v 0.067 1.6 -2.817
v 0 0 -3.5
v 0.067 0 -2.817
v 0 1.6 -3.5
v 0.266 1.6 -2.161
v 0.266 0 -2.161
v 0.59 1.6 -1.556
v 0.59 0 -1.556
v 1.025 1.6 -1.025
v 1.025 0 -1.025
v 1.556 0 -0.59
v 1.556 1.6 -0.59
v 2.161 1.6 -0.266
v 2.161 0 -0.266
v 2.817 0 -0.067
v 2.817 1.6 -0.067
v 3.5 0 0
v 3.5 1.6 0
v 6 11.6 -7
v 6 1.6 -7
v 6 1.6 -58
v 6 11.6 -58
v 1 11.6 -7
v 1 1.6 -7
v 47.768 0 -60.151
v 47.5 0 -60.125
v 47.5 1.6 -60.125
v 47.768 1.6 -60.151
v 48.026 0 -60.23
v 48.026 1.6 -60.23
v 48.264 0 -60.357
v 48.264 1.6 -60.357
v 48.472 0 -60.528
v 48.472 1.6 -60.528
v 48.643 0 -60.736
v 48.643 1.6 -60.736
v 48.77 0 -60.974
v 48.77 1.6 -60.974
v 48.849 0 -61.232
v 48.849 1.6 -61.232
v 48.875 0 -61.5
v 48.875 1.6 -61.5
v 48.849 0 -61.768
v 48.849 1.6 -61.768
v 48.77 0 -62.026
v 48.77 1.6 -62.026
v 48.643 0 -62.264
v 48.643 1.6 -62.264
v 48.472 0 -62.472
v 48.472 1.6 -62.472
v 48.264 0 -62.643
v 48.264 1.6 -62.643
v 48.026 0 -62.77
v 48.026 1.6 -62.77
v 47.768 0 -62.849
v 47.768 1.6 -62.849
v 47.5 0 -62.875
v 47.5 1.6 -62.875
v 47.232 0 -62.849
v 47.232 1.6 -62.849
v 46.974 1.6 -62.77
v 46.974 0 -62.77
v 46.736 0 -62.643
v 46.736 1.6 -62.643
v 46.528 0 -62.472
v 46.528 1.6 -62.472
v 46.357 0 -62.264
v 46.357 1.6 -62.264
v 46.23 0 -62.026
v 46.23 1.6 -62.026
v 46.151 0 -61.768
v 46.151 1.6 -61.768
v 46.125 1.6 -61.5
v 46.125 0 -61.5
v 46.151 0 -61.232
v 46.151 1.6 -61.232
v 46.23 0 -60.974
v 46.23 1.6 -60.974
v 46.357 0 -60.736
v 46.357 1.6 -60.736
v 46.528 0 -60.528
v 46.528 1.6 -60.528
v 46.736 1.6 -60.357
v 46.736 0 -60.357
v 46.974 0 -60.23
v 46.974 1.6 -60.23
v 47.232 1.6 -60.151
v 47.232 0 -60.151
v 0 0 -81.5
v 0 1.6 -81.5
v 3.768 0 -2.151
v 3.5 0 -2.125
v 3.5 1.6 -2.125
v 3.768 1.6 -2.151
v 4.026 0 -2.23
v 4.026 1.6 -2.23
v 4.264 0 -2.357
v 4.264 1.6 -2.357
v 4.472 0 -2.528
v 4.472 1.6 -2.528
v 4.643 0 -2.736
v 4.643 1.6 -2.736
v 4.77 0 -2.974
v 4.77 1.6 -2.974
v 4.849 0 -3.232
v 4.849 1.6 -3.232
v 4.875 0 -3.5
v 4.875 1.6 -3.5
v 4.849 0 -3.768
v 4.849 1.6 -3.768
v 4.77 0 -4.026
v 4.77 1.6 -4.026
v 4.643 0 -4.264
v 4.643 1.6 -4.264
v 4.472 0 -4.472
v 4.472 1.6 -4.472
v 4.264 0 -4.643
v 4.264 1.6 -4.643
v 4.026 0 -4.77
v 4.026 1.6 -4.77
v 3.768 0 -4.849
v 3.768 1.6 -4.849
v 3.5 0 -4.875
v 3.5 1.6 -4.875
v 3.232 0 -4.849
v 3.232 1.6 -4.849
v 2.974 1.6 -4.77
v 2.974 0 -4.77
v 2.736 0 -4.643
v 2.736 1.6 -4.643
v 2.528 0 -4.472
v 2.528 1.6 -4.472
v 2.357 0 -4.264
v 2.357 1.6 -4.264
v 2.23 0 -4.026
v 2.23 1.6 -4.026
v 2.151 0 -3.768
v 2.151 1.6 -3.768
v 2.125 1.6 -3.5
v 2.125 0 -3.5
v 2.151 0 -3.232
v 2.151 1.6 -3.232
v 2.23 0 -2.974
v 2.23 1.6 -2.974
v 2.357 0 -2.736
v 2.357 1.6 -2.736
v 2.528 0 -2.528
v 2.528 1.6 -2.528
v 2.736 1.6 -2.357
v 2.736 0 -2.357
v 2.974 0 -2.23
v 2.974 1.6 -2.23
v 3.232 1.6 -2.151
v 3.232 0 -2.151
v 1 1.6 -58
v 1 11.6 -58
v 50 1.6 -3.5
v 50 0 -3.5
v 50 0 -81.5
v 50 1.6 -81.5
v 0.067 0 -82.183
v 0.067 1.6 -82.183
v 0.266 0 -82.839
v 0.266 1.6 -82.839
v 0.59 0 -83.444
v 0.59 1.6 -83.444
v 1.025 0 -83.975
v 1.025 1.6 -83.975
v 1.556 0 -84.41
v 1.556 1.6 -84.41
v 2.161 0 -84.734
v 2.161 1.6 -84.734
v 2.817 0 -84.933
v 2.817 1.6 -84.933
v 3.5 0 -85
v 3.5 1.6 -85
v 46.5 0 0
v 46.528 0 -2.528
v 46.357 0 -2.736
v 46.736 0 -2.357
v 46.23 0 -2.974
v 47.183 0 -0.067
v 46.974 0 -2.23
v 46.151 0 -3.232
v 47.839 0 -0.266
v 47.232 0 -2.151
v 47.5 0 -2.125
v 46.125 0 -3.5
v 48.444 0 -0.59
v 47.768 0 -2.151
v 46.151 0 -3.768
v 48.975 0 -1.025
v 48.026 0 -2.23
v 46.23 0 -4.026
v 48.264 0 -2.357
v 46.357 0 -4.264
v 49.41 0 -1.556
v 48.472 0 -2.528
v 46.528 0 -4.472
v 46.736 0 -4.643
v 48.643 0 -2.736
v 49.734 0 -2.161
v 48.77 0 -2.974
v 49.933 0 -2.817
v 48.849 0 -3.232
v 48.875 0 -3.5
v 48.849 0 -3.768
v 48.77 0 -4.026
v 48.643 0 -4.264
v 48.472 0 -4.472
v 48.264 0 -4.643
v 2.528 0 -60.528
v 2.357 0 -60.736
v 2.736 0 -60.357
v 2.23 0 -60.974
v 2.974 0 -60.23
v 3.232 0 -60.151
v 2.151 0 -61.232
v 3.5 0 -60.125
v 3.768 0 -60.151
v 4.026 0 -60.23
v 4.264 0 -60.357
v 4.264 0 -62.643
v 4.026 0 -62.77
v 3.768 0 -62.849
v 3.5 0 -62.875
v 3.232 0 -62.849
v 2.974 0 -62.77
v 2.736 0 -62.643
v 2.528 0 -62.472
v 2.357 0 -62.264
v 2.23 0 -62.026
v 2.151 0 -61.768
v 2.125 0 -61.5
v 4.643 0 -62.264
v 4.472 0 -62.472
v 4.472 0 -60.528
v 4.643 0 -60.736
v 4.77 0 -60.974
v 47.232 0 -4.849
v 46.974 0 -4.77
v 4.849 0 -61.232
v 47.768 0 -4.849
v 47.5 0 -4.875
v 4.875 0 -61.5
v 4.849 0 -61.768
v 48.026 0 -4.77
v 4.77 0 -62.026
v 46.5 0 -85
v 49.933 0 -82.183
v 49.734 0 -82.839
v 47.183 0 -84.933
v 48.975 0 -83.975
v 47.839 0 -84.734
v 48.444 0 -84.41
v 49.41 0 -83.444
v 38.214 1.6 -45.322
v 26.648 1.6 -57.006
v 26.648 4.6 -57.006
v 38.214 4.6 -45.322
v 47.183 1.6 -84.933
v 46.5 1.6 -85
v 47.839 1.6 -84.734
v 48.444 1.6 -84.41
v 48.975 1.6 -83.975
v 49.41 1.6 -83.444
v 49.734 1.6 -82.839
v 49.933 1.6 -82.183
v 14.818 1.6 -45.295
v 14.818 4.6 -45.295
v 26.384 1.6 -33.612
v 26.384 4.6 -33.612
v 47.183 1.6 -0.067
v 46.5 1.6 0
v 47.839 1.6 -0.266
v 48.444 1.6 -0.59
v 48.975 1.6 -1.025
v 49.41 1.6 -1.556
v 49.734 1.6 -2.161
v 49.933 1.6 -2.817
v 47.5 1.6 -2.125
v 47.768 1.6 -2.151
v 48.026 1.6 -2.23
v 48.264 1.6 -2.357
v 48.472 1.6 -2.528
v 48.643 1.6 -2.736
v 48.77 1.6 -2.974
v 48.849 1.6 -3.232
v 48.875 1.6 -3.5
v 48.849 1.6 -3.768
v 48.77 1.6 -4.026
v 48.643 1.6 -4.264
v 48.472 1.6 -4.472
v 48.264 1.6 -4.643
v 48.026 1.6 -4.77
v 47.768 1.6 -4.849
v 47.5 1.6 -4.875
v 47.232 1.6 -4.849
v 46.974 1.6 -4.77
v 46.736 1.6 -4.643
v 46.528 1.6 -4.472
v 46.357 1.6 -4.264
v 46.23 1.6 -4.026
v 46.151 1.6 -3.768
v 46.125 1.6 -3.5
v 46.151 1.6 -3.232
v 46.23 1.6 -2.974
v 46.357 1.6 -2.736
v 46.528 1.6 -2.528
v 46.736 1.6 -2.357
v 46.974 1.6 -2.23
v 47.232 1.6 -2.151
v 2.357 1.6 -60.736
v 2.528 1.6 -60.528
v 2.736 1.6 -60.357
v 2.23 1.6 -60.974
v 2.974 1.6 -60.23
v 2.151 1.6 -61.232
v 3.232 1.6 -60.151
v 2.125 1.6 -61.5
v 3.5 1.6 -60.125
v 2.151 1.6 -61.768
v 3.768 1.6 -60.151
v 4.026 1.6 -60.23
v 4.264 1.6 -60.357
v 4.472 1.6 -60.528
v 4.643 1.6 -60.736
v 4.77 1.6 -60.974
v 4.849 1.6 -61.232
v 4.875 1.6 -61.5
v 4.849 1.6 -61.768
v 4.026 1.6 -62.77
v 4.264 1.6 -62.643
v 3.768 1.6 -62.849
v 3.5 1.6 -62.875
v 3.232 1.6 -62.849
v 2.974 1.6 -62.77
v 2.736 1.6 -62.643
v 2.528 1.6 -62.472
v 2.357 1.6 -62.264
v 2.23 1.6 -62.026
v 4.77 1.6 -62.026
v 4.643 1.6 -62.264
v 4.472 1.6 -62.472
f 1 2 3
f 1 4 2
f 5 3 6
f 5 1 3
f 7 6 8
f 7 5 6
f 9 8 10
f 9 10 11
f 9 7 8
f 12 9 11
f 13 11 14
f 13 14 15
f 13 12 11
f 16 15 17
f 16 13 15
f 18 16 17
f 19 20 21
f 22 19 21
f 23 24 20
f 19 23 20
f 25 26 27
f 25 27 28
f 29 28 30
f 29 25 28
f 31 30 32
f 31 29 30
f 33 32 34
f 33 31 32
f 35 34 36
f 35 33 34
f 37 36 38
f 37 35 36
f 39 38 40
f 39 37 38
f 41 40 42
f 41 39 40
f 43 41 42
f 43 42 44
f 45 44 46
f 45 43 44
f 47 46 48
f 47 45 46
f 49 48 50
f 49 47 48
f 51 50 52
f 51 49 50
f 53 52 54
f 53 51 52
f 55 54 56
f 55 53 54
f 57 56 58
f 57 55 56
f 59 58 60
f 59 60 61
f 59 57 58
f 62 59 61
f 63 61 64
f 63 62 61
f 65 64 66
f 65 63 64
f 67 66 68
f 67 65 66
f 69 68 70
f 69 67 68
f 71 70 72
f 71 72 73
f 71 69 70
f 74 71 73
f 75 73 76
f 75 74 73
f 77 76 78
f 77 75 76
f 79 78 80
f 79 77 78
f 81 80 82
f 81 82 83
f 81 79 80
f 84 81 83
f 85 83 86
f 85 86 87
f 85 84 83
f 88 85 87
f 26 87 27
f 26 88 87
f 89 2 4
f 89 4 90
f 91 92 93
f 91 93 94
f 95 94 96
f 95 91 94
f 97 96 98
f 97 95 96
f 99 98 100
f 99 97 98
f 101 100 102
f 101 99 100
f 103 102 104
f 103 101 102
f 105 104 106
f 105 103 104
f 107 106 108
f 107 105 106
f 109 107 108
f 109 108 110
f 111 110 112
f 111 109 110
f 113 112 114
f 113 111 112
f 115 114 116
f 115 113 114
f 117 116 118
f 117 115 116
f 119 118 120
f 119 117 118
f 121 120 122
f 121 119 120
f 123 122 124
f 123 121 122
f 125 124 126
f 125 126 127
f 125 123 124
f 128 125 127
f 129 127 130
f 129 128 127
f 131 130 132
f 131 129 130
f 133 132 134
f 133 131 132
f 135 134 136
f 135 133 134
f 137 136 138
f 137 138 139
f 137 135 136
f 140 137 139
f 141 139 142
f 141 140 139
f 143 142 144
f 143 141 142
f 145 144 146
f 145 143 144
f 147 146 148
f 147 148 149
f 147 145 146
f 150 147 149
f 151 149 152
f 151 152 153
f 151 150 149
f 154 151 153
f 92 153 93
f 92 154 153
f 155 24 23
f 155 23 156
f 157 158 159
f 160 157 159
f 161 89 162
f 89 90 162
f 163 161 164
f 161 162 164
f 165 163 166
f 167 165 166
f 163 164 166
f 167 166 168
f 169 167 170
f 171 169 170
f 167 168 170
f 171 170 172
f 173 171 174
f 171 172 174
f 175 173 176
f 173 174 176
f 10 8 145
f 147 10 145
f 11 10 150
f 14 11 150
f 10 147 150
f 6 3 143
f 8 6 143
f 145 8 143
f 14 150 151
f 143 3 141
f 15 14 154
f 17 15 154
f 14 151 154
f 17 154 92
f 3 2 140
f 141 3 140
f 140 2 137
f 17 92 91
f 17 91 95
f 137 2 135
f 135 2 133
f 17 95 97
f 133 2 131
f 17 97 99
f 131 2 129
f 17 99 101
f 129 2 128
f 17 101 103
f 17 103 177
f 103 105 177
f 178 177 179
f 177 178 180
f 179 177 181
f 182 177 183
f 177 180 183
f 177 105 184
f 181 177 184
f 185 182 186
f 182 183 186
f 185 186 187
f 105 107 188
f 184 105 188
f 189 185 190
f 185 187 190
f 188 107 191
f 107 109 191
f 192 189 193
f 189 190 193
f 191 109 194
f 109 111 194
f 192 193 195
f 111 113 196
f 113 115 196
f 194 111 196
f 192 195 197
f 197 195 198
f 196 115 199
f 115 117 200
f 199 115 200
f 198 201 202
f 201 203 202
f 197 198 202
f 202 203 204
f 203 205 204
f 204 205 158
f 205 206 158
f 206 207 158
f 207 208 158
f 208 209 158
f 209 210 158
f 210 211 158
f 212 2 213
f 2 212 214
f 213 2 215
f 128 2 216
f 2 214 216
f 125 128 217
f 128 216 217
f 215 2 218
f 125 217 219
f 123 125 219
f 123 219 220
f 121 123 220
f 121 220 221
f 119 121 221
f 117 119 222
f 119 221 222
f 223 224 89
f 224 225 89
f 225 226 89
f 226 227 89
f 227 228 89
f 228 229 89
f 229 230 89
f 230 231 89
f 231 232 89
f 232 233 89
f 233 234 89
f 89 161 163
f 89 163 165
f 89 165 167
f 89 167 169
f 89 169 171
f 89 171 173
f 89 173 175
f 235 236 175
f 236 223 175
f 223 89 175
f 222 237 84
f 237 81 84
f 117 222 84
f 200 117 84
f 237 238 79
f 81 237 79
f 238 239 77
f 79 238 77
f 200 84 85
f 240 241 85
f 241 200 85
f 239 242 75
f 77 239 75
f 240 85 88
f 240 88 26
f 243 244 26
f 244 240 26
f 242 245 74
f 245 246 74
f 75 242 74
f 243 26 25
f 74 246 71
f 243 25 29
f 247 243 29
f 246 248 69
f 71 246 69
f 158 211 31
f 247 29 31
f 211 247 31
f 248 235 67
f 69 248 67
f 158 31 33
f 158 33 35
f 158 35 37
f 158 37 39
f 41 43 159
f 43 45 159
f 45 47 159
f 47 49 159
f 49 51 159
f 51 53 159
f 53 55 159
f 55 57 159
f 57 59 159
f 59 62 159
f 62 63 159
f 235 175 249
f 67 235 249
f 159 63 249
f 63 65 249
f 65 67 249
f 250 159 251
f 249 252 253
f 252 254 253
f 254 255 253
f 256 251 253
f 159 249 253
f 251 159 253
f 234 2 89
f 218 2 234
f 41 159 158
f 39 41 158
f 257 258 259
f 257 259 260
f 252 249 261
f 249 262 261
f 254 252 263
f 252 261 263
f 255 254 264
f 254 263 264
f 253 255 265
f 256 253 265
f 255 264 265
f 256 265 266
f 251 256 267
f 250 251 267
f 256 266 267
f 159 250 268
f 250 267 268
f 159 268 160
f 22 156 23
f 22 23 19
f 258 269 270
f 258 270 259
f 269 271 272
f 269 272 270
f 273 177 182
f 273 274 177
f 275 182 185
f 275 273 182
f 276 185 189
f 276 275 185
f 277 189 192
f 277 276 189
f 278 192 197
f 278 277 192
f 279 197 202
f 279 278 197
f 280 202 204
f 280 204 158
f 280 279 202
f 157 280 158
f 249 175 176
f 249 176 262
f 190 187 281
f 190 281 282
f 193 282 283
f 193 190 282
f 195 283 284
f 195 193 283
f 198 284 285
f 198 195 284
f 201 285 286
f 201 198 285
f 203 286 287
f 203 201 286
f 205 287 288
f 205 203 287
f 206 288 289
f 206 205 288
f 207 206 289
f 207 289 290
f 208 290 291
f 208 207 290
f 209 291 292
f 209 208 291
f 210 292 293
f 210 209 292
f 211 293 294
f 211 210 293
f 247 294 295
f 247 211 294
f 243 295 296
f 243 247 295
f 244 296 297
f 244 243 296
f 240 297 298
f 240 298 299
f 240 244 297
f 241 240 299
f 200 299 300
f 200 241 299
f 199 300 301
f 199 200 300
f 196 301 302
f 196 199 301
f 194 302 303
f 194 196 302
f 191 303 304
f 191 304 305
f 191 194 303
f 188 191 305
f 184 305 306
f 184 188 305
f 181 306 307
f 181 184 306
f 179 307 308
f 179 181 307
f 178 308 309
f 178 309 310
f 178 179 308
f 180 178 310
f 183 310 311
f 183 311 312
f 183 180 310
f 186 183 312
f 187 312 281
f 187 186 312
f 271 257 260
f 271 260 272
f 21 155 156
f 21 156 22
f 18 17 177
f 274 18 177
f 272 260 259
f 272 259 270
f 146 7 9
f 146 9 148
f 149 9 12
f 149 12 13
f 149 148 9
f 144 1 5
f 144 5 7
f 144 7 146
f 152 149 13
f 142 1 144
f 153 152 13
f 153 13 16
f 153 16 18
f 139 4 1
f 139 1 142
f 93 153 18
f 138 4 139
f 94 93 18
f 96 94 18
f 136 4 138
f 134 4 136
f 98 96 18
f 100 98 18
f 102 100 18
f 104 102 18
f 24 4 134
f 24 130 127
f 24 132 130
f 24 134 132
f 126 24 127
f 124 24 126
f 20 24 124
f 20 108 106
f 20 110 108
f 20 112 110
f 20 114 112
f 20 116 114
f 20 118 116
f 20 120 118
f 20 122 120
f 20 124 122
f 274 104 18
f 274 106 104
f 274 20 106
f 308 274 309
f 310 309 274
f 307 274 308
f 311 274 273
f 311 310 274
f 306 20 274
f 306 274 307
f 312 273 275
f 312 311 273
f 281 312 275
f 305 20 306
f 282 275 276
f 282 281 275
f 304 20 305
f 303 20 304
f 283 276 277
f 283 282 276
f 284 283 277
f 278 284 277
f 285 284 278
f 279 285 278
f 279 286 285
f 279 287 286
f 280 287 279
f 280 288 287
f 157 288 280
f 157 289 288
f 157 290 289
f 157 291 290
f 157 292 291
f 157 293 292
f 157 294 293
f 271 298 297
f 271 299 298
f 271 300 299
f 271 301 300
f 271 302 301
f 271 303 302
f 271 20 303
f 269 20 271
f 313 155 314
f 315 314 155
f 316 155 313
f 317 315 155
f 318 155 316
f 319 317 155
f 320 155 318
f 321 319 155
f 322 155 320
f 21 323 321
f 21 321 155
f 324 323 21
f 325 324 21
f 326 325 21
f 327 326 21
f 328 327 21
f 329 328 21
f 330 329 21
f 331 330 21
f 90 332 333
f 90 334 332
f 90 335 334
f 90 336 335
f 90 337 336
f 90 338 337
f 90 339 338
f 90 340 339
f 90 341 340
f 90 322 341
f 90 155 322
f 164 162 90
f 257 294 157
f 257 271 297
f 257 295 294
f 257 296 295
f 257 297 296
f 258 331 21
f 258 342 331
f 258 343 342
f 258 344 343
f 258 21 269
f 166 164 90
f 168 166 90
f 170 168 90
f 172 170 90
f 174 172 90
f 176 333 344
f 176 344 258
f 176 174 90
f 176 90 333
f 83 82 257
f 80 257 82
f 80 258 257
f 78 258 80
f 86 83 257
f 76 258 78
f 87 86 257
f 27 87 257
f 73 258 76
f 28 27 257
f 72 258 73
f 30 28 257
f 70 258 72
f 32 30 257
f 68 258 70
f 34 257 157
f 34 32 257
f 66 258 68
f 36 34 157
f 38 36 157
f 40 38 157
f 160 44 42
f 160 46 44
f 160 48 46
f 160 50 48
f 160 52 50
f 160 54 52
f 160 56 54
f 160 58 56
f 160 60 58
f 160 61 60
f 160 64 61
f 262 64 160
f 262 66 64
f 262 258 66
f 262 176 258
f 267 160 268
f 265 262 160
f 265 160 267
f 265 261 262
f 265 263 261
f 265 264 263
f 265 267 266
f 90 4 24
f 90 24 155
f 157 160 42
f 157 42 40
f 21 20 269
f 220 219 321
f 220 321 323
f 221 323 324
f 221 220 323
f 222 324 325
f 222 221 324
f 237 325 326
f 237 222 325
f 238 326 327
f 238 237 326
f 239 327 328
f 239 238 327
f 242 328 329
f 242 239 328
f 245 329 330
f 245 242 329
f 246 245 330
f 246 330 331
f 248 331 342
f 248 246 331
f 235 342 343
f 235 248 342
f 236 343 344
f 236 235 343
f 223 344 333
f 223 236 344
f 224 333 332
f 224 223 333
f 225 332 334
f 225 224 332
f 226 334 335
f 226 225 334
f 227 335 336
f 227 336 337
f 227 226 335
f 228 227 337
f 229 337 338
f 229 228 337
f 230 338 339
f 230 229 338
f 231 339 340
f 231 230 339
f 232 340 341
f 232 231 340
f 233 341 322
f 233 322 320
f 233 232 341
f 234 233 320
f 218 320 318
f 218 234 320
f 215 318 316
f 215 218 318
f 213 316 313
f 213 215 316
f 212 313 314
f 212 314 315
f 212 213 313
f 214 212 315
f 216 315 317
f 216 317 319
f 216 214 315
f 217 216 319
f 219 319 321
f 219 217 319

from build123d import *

# Parameters (mm, degrees)
SKETCH1_W           = 50
SKETCH1_H           = 85
SKETCH1_R           = 1.375
BOSS_EXTRUDE1_DEPTH = 1.6
FILLET1_R           = 3.5
SKETCH5_W           = 5
SKETCH5_H           = 51
BOSS_EXTRUDE3_DEPTH = 10
BOSS_EXTRUDE4_DEPTH = 3


with BuildPart() as part:
    # Sketch1 → Boss-Extrude1 (new body)
    with BuildSketch(Plane(origin=(0, 0, 0), x_dir=(1, 0, 0), z_dir=(0, 1, 0))):
        with Locations((25, 42.5)):
            Rectangle(SKETCH1_W, SKETCH1_H)
        with Locations(Location((3.5, 3.5, 0), (0, 0, 270))):
            Circle(SKETCH1_R, mode=Mode.SUBTRACT)
        with Locations(Location((47.5, 3.5, 0), (0, 0, 270))):
            Circle(SKETCH1_R, mode=Mode.SUBTRACT)
        with Locations(Location((47.5, 61.5, 0), (0, 0, 270))):
            Circle(SKETCH1_R, mode=Mode.SUBTRACT)
        with Locations(Location((3.5, 61.5, 0), (0, 0, 270))):
            Circle(SKETCH1_R, mode=Mode.SUBTRACT)
    extrude(amount=BOSS_EXTRUDE1_DEPTH)

    # Fillet1
    fillet1_edges = [part.edges().sort_by_distance(p)[0] for p in [
        (0, 0.8, -85),
        (50, 0.8, -85),
        (50, 0.8, 0),
        (0, 0.8, 0),
    ]]
    fillet(fillet1_edges, radius=FILLET1_R)

    # Sketch5 → Boss-Extrude3 (add)
    with BuildSketch(Plane(origin=(0, 1.6, 0), x_dir=(1, 0, 0), z_dir=(0, 1, 0))):
        with Locations((3.5, 32.5)):
            Rectangle(SKETCH5_W, SKETCH5_H)
    extrude(amount=BOSS_EXTRUDE3_DEPTH)

    # Sketch6 → Boss-Extrude4 (add)
    with BuildSketch(Plane(origin=(0, 1.6, 0), x_dir=(1, 0, 0), z_dir=(0, 1, 0))):
        Polygon((26.64840561, 57.006203003), (38.214146185, 45.322359626), (26.383805878, 33.611602944), (14.818065303, 45.295446321), align=None)
    extrude(amount=BOSS_EXTRUDE4_DEPTH)


solid = part.part
